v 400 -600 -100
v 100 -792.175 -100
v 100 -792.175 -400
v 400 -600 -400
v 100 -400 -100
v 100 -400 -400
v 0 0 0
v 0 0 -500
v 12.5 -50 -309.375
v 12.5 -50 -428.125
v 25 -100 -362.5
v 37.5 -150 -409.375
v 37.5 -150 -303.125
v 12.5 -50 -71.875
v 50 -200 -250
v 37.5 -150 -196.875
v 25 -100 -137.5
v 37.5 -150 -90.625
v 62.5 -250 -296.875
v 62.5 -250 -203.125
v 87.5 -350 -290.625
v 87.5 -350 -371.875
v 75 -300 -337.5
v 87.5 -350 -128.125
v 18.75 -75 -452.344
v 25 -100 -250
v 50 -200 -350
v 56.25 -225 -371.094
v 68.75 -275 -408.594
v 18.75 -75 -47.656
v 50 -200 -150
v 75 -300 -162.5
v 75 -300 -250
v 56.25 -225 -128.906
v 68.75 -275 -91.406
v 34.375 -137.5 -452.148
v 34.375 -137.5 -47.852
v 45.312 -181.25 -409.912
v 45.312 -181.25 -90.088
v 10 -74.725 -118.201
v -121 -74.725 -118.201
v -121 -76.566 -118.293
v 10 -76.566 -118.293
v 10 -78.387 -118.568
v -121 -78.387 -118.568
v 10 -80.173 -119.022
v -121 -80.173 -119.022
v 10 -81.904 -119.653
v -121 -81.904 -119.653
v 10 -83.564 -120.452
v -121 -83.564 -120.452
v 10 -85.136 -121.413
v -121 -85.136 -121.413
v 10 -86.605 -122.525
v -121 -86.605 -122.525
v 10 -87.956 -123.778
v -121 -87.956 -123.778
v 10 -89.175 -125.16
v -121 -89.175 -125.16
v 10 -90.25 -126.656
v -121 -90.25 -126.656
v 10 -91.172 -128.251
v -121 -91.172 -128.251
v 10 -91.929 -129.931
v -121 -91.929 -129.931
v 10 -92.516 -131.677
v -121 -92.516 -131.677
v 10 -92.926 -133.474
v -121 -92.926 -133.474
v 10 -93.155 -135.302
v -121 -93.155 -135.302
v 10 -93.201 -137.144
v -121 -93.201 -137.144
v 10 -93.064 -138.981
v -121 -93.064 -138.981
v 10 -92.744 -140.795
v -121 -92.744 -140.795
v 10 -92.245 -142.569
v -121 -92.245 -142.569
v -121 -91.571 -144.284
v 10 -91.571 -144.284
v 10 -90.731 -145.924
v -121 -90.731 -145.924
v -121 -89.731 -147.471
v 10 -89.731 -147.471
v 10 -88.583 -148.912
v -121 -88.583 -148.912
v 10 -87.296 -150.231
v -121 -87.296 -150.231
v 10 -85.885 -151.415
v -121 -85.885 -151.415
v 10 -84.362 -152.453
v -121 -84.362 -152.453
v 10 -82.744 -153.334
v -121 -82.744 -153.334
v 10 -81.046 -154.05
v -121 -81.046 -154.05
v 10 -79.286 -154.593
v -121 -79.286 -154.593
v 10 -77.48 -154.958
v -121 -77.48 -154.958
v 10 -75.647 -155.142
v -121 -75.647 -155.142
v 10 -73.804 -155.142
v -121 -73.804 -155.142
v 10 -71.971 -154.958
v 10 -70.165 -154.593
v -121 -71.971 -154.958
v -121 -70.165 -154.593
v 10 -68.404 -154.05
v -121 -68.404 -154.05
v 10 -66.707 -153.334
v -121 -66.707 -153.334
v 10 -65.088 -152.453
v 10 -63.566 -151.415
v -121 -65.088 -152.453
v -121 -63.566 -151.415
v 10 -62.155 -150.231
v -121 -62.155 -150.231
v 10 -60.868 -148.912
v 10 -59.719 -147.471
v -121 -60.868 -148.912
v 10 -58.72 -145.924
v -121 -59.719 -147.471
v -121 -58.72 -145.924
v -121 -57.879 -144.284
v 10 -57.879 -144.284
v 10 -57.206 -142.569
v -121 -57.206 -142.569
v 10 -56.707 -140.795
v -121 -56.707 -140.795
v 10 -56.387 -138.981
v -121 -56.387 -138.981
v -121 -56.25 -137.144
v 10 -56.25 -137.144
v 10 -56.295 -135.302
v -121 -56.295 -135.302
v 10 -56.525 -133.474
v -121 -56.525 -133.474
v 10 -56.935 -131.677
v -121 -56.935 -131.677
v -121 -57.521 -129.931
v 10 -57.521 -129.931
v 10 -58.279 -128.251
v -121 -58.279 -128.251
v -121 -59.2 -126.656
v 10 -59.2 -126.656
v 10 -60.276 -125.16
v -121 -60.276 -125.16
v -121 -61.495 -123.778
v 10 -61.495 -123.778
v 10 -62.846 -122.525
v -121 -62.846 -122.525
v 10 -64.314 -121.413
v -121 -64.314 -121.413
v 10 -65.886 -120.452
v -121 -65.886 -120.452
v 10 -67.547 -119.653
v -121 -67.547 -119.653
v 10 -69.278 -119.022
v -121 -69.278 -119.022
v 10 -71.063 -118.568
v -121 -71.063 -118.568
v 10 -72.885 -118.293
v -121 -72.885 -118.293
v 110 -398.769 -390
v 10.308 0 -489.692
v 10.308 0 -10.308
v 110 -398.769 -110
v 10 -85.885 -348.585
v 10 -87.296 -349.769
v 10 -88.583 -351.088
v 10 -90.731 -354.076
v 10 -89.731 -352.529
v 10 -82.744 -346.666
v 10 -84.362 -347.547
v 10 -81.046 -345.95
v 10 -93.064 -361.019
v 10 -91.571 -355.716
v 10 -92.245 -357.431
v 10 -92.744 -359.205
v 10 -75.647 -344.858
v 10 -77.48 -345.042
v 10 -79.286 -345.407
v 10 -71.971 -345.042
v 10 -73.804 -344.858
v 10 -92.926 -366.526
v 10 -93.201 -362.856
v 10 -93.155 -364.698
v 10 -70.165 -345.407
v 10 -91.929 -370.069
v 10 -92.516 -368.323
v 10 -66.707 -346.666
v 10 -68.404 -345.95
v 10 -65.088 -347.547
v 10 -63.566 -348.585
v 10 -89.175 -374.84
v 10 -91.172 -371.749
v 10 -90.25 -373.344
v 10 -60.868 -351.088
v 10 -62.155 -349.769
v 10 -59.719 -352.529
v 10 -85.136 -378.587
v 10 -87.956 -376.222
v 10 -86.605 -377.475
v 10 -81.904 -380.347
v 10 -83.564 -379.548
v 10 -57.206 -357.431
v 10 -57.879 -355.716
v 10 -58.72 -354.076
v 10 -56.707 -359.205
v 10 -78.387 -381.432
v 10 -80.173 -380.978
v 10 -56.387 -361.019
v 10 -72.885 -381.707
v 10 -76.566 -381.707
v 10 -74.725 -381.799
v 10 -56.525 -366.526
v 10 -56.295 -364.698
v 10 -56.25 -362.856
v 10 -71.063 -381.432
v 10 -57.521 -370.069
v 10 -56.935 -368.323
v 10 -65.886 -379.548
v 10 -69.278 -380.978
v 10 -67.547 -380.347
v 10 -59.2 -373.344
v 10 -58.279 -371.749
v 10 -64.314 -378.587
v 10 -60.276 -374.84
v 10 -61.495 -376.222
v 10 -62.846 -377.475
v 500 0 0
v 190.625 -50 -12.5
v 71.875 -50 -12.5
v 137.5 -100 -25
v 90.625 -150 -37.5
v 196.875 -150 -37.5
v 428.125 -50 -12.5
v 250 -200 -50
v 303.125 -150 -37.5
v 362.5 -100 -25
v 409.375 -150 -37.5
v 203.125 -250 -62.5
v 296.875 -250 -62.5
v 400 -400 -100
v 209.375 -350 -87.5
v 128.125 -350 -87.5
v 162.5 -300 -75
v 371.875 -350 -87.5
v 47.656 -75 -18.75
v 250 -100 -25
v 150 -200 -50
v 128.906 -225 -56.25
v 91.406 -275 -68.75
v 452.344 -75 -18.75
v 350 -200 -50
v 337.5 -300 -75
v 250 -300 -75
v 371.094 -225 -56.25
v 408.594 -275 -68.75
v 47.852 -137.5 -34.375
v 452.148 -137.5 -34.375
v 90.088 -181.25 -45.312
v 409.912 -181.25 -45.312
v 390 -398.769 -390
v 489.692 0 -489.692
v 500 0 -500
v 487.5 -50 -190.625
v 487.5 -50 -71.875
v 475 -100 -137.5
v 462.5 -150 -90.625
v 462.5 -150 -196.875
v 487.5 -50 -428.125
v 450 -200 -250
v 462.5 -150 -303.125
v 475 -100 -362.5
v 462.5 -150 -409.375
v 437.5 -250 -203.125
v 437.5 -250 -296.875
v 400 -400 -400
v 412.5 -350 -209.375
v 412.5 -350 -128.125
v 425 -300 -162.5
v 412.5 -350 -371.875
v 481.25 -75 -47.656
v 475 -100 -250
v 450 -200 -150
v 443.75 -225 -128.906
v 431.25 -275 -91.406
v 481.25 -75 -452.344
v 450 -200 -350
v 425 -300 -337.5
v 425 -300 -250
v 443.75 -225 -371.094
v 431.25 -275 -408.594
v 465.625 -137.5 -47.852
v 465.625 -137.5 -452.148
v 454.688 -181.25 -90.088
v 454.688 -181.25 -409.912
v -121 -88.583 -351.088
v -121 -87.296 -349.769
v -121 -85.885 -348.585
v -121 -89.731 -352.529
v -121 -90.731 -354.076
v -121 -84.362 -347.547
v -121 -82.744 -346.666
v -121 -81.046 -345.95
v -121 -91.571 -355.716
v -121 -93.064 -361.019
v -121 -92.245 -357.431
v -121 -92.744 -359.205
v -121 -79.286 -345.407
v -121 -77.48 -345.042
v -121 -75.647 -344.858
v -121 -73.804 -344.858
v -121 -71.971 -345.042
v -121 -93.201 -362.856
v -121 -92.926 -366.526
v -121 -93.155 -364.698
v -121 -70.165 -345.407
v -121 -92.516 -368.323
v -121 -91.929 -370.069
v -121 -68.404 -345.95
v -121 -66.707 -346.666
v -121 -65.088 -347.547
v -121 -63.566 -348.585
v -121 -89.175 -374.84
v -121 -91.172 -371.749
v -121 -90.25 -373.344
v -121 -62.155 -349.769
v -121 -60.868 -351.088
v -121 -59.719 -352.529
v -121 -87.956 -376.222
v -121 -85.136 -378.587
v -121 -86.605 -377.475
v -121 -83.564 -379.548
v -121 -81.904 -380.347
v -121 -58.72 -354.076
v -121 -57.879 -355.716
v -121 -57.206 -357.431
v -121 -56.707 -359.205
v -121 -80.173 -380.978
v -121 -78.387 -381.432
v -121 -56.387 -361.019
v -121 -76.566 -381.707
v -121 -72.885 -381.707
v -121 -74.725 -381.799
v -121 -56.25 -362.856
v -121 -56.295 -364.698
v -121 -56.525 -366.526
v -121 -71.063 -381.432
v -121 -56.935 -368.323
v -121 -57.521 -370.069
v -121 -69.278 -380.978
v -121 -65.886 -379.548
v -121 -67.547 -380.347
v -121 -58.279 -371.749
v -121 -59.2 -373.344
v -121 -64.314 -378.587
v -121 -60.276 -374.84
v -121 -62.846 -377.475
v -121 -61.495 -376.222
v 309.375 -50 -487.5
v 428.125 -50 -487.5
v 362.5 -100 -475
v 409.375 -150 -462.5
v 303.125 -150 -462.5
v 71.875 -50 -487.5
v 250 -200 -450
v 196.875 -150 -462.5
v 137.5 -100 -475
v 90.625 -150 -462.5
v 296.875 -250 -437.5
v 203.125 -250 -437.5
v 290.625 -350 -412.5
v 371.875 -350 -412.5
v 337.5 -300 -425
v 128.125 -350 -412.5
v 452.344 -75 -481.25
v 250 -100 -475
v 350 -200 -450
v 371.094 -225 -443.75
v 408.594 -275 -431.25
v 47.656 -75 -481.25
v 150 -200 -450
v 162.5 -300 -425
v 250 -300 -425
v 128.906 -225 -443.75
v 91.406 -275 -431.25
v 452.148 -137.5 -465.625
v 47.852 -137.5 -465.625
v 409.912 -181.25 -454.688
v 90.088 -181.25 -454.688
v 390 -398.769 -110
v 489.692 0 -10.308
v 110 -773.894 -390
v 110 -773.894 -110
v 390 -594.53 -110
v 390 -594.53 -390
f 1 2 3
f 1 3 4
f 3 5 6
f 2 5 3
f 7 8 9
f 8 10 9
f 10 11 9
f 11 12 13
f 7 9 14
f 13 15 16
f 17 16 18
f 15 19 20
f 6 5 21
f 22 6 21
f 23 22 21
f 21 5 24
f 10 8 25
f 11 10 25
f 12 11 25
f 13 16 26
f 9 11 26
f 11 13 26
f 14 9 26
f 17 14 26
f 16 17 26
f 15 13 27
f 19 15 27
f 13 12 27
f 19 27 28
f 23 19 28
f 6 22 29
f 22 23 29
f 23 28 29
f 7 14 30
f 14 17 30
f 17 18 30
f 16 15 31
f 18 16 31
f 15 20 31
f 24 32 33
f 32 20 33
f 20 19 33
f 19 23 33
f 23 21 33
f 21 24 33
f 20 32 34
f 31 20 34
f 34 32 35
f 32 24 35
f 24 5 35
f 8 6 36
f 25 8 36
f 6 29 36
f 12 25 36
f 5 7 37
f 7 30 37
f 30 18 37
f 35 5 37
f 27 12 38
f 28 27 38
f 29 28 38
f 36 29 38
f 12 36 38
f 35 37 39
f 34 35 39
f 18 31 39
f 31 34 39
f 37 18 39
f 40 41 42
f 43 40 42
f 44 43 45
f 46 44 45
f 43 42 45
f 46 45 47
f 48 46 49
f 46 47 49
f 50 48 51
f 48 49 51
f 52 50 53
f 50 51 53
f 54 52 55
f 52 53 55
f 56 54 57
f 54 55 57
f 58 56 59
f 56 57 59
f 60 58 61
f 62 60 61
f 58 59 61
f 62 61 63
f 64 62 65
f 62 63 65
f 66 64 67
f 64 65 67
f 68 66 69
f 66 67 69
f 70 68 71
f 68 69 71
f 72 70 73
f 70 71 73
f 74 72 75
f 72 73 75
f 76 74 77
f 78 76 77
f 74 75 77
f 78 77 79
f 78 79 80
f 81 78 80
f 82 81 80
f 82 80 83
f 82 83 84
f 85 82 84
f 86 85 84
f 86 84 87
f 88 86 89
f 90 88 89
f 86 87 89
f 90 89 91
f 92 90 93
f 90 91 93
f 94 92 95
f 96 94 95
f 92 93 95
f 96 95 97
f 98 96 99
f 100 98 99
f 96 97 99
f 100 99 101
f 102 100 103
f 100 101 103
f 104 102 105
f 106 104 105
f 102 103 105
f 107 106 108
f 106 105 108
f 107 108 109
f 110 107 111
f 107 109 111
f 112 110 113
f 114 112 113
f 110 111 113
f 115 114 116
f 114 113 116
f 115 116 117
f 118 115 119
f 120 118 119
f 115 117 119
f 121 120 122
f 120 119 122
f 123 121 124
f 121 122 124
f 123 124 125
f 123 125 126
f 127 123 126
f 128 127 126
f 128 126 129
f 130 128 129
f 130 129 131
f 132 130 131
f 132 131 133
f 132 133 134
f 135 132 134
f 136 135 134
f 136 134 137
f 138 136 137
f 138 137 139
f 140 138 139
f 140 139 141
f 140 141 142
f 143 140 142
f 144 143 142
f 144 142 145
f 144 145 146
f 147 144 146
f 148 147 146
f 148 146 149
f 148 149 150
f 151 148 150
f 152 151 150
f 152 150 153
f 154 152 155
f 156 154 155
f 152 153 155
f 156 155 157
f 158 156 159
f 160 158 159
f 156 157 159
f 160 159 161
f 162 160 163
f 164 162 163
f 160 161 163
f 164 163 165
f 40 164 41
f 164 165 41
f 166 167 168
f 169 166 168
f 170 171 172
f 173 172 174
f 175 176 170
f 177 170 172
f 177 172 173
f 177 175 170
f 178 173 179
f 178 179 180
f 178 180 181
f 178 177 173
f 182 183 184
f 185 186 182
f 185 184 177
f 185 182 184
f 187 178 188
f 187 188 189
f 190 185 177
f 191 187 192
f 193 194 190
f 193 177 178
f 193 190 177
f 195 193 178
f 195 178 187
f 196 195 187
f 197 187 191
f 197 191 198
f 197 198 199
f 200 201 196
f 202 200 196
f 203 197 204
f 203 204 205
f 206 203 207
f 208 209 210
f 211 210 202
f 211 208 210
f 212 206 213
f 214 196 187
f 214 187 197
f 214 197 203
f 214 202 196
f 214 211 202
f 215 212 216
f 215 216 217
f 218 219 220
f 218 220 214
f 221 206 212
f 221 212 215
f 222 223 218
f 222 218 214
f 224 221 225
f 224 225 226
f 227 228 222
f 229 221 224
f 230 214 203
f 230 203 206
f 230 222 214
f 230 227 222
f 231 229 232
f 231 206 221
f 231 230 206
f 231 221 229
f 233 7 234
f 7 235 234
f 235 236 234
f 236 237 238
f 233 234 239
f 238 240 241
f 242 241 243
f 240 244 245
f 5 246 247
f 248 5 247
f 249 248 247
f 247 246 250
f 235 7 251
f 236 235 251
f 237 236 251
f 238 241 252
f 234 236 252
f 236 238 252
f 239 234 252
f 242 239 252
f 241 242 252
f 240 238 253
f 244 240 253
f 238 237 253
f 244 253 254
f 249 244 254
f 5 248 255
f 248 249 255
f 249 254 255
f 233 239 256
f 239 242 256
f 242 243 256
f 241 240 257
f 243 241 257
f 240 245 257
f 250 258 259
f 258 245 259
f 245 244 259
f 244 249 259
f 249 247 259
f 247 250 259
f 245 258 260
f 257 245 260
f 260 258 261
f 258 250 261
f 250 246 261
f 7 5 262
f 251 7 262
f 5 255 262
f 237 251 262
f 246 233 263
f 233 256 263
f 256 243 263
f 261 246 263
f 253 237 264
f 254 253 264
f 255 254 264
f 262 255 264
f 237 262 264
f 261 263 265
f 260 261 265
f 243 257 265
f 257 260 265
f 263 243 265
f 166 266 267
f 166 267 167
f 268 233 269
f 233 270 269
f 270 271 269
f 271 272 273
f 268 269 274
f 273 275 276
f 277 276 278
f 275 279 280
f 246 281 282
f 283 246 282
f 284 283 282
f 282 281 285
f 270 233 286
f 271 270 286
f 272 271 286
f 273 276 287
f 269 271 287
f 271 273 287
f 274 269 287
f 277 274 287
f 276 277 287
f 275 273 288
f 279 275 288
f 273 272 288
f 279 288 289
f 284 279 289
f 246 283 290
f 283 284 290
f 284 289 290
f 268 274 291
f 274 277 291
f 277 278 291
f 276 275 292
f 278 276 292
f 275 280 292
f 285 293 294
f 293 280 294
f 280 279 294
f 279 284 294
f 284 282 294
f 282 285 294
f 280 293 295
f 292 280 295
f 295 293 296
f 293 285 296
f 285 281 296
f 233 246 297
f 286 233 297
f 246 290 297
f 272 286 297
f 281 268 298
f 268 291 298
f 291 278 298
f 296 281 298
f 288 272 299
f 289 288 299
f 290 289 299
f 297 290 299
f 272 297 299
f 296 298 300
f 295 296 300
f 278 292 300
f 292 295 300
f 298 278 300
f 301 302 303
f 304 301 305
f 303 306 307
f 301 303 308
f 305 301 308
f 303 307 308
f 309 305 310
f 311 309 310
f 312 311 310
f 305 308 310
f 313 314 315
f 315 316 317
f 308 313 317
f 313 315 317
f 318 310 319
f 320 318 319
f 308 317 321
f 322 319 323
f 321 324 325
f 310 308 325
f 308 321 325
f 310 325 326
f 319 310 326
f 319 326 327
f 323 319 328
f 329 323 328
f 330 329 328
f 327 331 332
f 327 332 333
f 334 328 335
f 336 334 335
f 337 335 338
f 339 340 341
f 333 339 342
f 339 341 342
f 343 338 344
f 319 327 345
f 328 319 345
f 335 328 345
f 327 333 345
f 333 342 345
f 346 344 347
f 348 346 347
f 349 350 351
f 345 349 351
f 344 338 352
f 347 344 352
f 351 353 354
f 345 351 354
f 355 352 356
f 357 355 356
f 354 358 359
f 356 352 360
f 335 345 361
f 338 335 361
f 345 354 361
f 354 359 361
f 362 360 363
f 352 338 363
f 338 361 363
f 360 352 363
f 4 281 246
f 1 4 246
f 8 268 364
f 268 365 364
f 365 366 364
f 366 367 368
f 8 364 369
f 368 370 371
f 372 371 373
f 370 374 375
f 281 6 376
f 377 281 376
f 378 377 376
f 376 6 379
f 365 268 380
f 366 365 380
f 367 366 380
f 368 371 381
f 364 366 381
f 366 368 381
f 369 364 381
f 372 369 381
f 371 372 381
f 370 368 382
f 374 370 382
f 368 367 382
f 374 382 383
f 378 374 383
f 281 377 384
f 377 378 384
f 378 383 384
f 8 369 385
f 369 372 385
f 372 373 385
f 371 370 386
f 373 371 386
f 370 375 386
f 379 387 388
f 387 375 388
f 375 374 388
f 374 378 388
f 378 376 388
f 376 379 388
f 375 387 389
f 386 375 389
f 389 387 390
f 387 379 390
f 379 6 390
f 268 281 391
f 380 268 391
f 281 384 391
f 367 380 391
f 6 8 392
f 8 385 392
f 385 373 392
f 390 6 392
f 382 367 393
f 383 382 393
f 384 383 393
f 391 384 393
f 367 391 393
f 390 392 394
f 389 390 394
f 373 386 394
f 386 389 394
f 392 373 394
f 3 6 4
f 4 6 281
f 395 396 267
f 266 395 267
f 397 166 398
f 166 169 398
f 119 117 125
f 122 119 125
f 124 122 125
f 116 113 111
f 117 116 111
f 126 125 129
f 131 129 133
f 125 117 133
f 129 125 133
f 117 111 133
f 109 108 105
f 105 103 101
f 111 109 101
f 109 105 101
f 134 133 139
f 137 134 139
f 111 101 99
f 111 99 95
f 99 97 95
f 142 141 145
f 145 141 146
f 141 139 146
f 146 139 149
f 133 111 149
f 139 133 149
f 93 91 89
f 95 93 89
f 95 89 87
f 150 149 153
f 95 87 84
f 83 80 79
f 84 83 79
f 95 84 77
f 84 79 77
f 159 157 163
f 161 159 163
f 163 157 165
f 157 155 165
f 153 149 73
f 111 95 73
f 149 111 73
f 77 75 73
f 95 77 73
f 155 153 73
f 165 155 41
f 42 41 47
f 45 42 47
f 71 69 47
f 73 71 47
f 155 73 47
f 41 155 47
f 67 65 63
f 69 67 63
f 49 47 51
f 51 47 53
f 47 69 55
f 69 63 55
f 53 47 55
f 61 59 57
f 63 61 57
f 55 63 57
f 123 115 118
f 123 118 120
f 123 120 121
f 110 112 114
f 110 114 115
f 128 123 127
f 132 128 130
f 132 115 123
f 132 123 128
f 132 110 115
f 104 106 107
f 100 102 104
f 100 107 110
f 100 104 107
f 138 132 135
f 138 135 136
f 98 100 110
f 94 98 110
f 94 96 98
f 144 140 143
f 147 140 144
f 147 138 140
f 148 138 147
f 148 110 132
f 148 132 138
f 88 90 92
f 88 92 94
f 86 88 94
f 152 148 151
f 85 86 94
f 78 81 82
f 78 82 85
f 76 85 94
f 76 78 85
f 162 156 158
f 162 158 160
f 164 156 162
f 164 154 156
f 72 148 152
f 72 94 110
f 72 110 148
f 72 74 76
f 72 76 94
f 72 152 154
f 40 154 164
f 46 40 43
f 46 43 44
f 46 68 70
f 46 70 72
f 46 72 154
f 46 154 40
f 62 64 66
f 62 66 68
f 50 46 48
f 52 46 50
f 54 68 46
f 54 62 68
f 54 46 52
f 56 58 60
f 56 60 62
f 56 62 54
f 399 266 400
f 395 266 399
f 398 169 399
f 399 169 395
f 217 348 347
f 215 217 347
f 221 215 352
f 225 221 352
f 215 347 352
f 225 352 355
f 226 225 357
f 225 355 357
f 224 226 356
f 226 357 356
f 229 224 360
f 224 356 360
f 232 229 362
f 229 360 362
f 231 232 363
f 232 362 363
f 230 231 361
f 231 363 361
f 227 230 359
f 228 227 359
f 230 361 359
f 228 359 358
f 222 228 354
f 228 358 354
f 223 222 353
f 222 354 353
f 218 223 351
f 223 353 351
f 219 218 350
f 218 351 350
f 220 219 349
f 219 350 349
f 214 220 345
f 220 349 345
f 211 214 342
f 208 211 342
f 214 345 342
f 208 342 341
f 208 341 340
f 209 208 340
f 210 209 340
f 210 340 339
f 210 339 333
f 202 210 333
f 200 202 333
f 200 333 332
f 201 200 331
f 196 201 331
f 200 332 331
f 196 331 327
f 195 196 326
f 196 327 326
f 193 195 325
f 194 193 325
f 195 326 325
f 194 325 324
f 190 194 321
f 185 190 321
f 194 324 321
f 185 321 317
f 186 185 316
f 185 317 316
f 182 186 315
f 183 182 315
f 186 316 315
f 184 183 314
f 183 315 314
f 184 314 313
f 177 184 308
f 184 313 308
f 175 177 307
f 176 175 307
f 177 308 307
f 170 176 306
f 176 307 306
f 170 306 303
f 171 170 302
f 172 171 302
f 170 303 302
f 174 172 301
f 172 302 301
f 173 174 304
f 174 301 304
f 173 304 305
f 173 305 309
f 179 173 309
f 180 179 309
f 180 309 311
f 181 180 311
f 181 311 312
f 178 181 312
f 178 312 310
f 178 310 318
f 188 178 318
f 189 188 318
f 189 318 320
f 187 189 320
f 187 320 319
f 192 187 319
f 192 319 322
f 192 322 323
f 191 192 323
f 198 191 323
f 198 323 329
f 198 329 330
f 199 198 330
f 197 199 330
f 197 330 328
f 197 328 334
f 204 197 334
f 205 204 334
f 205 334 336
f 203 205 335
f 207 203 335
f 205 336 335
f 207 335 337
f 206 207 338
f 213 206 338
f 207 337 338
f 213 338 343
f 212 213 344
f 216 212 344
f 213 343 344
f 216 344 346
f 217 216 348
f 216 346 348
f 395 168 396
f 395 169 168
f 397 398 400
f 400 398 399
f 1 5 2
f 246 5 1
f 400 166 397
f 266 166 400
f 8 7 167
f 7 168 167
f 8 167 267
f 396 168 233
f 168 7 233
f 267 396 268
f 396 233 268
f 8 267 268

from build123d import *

# Parameters (mm, degrees)
CROQUIS4_W                     = 300
CROQUIS4_H                     = 300
SALIENTE_EXTRUIR1_DEPTH        = 200
SALIENTE_EXTRUIR2_DEPTH        = 300
VACIADO1_T                     = -10
SALIENTE_EXTRUIR3_DEPTH        = 10
SALIENTE_EXTRUIR3_DEPTH_BACK   = 121
CROQUIS6_R                     = 18.481607755
SALIENTE_EXTRUIR3_2_DEPTH      = 10
SALIENTE_EXTRUIR3_2_DEPTH_BACK = 121


with BuildPart() as part:
    # Croquis2 → Recubrir1 section 0
    with BuildSketch(Plane(origin=(0, 0, 0), x_dir=(1, 0, 0), z_dir=(0, 1, 0))):
        with BuildLine():
            Line((0, 0), (500, 0))
            Line((500, 0), (500, 500))
            Line((500, 500), (0, 500))
            Line((0, 500), (0, 0))
        make_face()
    # Croquis3 → Recubrir1 section 1
    with BuildSketch(Plane(origin=(0, -400, 0), x_dir=(1, 0, 0), z_dir=(0, 1, 0))):
        with BuildLine():
            Line((100, 400), (400, 400))
            Line((400, 400), (400, 100))
            Line((400, 100), (100, 100))
            Line((100, 100), (100, 400))
        make_face()
    loft()

    # Croquis4 → Saliente-Extruir1 (add)
    with BuildSketch(Plane.XZ.offset(400)):
        with Locations((250, -250)):
            Rectangle(CROQUIS4_W, CROQUIS4_H)
    extrude(amount=SALIENTE_EXTRUIR1_DEPTH)

    # Croquis5 → Saliente-Extruir2 (add)
    with BuildSketch(Plane.XY.offset(-100)):
        Polygon((100, -600), (100, -792.175192929), (400, -600), align=None)
    extrude(amount=-SALIENTE_EXTRUIR2_DEPTH)

    # Vaciado1
    vaciado1_openings = [part.faces().sort_by_distance(p)[0] for p in [
        (250, 0, -250),
    ]]
    offset(amount=VACIADO1_T, openings=vaciado1_openings, kind=Kind.INTERSECTION)


with BuildPart() as body_2:
    # Croquis6 → Saliente-Extruir3 (new, two sides: drawn at the far end of the back side and taken through both)
    with BuildSketch(Plane(origin=(0, 0, 0), x_dir=(0, 0, -1), z_dir=(1, 0, 0)).offset(-SALIENTE_EXTRUIR3_DEPTH_BACK)):
        with Locations((363.317119746, -74.725401963)):
            Circle(CROQUIS6_R)
    extrude(amount=SALIENTE_EXTRUIR3_DEPTH + SALIENTE_EXTRUIR3_DEPTH_BACK)


with BuildPart() as body_3:
    # Croquis6 → Saliente-Extruir3 2 (new, two sides: drawn at the far end of the back side and taken through both)
    with BuildSketch(Plane(origin=(0, 0, 0), x_dir=(0, 0, -1), z_dir=(1, 0, 0)).offset(-SALIENTE_EXTRUIR3_2_DEPTH_BACK)):
        with Locations(Location((136.682880254, -74.725401963, 0), (0, 0, 180))):
            Circle(CROQUIS6_R)
    extrude(amount=SALIENTE_EXTRUIR3_2_DEPTH + SALIENTE_EXTRUIR3_2_DEPTH_BACK)


solid = Compound([part.part, body_2.part, body_3.part])
